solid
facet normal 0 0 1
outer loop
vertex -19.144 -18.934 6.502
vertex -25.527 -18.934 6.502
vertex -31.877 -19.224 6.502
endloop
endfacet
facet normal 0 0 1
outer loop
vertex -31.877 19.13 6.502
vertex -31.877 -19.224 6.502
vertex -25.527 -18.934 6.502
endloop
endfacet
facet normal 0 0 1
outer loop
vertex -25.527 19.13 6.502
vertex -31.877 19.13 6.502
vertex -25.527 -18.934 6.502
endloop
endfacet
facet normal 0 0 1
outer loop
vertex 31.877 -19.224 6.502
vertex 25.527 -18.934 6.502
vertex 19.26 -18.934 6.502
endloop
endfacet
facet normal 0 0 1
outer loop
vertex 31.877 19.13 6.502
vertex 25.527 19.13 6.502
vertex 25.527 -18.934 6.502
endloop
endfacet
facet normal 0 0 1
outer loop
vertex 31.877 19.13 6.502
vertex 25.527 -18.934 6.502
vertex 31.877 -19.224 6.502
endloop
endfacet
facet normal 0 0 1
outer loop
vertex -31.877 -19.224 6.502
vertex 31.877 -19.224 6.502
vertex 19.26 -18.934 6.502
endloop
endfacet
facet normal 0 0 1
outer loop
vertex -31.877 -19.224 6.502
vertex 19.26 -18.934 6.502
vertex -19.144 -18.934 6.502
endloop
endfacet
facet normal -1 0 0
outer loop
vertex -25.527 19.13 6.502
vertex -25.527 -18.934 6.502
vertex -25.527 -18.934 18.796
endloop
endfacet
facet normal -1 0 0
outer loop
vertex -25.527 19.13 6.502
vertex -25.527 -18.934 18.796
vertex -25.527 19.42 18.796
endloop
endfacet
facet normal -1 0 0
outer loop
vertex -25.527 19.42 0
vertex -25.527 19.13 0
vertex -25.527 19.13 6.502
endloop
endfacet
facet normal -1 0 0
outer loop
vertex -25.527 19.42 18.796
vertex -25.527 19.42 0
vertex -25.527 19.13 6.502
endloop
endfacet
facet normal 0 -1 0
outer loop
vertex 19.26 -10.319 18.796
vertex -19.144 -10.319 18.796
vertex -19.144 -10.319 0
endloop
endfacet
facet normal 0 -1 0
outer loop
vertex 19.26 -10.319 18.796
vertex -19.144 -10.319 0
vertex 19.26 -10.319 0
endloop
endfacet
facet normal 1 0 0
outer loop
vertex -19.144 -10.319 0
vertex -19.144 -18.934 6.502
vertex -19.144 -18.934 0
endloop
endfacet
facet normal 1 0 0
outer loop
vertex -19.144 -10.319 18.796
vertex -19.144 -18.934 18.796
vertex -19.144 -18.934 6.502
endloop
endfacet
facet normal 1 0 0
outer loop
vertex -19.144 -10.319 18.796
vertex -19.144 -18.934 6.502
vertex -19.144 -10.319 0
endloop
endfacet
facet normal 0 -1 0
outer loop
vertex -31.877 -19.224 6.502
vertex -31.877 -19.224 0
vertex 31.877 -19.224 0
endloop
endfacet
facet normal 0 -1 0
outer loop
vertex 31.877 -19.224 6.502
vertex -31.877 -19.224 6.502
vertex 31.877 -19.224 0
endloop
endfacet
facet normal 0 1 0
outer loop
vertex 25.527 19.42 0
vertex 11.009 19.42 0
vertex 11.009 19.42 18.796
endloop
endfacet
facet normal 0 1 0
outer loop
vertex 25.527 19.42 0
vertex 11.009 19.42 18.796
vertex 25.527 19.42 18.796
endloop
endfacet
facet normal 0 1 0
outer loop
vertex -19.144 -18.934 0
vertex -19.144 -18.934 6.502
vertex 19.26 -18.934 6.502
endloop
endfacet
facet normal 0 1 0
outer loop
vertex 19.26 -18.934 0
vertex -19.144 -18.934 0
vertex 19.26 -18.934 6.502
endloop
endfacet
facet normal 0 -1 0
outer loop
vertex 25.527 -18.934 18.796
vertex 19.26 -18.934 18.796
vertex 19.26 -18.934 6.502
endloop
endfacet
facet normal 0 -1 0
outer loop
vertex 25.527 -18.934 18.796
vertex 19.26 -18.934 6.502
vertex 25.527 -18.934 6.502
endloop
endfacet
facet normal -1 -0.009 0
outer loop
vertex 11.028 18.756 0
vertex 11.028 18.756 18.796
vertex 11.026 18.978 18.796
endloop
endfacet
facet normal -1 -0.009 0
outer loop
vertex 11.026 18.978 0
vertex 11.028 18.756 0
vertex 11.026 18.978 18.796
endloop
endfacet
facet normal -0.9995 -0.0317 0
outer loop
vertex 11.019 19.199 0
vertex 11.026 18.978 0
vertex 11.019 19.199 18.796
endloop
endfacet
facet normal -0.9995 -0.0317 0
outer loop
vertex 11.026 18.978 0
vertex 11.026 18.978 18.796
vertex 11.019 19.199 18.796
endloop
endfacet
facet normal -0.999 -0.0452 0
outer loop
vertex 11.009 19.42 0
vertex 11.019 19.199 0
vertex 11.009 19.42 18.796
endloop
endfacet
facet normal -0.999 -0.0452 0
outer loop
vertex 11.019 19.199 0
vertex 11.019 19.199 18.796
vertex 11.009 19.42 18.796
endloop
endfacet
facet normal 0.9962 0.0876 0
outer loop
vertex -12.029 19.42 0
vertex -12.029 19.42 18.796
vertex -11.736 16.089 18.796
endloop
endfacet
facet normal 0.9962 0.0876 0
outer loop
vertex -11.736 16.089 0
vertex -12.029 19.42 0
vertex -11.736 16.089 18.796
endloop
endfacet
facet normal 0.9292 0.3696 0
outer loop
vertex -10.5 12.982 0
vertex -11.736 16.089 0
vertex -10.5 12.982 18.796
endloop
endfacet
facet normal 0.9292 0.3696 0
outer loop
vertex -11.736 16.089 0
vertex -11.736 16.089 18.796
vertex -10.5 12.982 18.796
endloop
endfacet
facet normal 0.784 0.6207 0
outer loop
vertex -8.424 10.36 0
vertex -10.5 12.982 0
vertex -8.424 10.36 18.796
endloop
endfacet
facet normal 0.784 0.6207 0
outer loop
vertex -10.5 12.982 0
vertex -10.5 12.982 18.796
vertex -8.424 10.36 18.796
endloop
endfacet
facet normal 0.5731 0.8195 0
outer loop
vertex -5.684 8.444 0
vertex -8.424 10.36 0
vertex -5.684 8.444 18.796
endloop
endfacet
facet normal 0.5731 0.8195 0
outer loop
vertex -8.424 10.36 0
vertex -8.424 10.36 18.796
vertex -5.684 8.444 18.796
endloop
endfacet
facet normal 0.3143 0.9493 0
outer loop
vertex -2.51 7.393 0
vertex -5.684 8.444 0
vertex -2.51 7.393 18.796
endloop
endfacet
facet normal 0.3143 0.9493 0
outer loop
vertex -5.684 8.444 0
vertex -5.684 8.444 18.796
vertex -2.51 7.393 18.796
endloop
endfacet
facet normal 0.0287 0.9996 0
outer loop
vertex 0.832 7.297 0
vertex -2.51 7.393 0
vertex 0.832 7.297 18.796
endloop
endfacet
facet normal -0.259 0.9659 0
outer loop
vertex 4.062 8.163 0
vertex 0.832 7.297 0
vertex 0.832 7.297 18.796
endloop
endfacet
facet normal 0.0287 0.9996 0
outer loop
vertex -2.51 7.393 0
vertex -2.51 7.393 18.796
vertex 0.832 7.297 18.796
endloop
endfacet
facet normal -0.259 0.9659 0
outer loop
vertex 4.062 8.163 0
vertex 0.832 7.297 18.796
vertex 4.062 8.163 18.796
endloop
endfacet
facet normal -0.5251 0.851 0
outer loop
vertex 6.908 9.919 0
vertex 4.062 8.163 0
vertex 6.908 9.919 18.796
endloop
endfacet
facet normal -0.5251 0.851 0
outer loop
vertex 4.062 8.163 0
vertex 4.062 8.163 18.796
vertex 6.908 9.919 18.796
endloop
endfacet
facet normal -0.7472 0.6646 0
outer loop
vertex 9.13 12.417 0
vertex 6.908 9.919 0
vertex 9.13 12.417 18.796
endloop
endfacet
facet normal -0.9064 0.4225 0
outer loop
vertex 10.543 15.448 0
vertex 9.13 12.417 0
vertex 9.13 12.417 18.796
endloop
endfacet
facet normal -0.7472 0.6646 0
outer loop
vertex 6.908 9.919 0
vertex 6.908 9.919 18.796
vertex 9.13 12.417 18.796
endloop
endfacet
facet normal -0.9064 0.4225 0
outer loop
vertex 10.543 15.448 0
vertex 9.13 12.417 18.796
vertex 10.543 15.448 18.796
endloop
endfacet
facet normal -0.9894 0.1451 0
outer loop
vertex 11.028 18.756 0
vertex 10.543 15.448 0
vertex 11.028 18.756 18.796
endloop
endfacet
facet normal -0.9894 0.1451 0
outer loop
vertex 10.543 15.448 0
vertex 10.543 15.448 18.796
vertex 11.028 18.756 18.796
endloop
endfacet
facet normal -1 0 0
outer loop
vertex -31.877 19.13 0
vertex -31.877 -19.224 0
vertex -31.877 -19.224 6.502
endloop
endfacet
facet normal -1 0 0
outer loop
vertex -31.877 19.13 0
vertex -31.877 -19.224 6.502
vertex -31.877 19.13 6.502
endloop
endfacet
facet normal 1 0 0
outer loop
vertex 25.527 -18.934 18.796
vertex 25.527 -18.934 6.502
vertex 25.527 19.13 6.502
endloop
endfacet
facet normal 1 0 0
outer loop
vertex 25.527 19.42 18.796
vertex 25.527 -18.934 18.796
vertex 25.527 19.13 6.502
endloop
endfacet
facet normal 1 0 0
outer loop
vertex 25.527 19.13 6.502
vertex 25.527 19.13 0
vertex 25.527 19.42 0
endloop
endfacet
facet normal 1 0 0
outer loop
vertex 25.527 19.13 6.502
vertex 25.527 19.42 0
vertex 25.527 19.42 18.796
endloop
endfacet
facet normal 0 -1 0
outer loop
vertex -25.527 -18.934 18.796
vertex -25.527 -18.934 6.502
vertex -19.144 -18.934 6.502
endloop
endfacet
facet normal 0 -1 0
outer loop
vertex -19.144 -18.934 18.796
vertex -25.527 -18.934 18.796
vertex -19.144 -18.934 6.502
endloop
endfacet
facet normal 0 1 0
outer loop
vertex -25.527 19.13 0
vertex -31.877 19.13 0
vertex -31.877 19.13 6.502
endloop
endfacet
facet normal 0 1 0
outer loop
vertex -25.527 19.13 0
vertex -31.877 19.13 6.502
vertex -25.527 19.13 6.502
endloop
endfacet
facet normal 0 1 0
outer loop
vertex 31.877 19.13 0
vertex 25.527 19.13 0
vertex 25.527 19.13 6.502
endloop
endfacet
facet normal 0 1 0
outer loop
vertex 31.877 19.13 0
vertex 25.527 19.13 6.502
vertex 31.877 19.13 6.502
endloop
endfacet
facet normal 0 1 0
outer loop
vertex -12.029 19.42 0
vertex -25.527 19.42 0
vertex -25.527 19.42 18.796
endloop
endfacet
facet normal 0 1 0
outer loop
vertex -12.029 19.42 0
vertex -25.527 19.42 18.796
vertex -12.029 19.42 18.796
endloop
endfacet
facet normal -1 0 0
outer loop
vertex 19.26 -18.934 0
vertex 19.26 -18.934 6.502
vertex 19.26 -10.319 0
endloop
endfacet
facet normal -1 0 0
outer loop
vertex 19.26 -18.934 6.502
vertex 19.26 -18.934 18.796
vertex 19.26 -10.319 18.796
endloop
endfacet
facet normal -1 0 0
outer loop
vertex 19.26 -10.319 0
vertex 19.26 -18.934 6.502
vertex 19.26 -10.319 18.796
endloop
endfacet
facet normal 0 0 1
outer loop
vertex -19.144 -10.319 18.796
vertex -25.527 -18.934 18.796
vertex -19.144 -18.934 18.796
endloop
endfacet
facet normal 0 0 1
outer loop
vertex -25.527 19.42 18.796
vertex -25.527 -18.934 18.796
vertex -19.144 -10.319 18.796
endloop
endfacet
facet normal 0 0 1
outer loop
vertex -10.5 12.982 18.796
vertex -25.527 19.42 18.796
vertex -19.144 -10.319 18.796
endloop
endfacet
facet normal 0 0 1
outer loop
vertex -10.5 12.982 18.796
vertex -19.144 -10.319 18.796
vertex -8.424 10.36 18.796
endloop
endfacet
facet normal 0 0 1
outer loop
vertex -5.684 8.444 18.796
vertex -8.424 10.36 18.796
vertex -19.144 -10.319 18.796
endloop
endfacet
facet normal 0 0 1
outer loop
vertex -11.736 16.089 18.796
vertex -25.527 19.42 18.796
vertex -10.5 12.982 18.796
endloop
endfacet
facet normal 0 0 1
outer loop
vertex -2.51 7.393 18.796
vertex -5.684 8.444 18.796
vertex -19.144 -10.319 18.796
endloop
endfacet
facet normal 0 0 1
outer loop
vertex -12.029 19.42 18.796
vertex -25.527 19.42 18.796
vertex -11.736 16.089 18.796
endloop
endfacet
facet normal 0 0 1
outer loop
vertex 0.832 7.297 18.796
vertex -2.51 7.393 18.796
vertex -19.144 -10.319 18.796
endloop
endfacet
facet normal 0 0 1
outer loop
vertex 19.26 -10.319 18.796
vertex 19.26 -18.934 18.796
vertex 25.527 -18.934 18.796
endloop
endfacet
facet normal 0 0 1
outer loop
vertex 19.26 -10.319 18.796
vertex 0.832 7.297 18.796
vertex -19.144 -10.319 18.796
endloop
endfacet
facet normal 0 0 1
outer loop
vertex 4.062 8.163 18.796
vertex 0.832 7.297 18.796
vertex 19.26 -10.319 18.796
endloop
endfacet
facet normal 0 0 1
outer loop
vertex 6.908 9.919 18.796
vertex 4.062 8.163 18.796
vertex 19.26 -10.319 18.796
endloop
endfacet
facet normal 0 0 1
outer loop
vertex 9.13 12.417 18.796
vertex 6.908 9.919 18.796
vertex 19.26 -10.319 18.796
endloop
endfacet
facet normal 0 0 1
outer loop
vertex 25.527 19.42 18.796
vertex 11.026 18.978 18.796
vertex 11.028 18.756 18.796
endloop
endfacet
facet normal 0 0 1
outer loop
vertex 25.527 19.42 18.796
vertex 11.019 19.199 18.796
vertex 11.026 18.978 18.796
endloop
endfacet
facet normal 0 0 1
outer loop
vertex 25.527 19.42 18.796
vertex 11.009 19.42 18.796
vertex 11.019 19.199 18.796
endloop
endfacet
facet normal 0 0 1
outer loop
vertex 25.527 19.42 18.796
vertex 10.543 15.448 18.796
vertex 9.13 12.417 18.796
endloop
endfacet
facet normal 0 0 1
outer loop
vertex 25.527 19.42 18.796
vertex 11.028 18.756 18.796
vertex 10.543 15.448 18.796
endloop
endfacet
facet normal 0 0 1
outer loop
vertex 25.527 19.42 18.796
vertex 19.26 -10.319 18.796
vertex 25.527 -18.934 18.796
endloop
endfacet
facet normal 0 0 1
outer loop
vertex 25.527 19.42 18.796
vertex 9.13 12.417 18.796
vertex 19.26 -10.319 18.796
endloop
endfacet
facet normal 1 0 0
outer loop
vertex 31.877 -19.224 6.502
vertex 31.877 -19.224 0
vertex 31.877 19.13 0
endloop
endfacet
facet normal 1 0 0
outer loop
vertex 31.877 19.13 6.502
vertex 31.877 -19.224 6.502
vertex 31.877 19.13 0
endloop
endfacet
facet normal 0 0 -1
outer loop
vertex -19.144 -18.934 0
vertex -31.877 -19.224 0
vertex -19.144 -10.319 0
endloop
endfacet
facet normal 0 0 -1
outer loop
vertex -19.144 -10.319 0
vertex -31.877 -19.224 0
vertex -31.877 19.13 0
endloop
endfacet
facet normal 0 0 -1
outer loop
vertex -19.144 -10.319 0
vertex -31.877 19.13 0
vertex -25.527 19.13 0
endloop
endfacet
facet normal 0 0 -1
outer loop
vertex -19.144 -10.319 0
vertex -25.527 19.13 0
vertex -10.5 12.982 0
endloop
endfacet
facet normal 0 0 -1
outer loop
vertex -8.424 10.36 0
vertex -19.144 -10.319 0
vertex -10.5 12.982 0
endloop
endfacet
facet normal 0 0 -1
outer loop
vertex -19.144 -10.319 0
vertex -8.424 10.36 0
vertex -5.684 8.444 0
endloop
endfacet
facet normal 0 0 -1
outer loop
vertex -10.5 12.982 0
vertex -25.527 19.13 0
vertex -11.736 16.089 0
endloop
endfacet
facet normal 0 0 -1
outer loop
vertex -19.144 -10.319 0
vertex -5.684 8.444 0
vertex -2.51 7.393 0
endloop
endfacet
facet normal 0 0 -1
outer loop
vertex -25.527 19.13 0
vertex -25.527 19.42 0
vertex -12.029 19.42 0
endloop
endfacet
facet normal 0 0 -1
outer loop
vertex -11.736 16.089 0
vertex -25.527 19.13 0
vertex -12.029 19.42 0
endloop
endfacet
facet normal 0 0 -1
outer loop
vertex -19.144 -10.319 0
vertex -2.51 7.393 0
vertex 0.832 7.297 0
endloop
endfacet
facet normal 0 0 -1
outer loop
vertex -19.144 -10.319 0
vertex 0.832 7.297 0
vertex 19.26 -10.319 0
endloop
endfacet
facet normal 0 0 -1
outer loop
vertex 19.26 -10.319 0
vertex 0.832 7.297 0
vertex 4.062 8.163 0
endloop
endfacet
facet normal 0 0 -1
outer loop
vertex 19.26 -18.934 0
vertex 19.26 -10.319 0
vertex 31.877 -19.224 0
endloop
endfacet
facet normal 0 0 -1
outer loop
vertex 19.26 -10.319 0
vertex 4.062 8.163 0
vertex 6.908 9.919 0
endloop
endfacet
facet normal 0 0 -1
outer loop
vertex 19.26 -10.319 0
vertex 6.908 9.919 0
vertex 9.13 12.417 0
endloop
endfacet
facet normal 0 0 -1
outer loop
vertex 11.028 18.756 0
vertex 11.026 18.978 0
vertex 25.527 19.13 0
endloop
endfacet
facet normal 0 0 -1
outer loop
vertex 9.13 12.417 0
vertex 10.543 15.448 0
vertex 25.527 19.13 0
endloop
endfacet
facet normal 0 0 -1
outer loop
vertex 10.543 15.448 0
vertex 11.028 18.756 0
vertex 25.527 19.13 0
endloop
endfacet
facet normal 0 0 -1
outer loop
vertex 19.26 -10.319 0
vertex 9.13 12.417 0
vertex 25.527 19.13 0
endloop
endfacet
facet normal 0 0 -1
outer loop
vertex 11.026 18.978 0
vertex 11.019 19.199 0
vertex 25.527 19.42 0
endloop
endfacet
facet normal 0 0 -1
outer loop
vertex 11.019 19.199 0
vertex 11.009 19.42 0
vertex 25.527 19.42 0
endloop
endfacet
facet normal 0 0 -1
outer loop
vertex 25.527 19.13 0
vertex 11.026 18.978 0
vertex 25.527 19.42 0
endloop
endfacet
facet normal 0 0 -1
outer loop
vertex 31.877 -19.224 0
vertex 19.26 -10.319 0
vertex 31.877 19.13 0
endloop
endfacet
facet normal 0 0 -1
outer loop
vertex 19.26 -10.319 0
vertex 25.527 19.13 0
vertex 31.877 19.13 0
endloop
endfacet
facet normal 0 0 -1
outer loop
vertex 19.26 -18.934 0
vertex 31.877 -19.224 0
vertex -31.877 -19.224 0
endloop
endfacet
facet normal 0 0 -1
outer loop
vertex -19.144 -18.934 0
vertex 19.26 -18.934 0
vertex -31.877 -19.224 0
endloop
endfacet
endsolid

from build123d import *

# Parameters (mm, degrees)
F0_W     = 63.754
F0_H     = 38.354
F1_DEPTH = 6.5024
F2_W     = 51.054
F2_H     = 38.354
F3_DEPTH = 18.796
F4_W     = 38.4032912552
F4_H     = 8.6150002171
F5_DEPTH = 25.4
F7_DEPTH = 18.797


with BuildPart() as f1:
    # F0 (on Top) → F1 (new body)
    with BuildSketch(Plane.XY):
        with Locations((0, -0.0474722673)):
            Rectangle(F0_W, F0_H)
    extrude(amount=F1_DEPTH)

    # F2 (on Top) → F3 (join)
    with BuildSketch(Plane.XY):
        with Locations((0, 0.243213877)):
            Rectangle(F2_W, F2_H)
    extrude(amount=F3_DEPTH)

    # F4 (on face) → F5 (cut)
    with BuildSketch(Plane.XY.offset(18.796)):
        with Locations((0.0579152256, -14.6262860144)):
            Rectangle(F4_W, F4_H)
    extrude(amount=-F5_DEPTH, mode=Mode.SUBTRACT)

    # F6 (on face) → F7 (cut, through all)
    with BuildSketch(Plane.XY.offset(18.796)):
        with BuildLine():
            ThreePointArc((11.0276596023, 18.7562172295), (11.0228780842, 19.0883531968), (11.0085374932, 19.420213877))
            Line((11.0085374932, 19.420213877), (-12.0289784785, 19.420213877))
            ThreePointArc((-12.0289784785, 19.420213877), (-0.8423564599, 7.2231186526), (11.0276596023, 18.7562172295))
        make_face()
    extrude(amount=-F7_DEPTH, mode=Mode.SUBTRACT)


solid = f1.part
